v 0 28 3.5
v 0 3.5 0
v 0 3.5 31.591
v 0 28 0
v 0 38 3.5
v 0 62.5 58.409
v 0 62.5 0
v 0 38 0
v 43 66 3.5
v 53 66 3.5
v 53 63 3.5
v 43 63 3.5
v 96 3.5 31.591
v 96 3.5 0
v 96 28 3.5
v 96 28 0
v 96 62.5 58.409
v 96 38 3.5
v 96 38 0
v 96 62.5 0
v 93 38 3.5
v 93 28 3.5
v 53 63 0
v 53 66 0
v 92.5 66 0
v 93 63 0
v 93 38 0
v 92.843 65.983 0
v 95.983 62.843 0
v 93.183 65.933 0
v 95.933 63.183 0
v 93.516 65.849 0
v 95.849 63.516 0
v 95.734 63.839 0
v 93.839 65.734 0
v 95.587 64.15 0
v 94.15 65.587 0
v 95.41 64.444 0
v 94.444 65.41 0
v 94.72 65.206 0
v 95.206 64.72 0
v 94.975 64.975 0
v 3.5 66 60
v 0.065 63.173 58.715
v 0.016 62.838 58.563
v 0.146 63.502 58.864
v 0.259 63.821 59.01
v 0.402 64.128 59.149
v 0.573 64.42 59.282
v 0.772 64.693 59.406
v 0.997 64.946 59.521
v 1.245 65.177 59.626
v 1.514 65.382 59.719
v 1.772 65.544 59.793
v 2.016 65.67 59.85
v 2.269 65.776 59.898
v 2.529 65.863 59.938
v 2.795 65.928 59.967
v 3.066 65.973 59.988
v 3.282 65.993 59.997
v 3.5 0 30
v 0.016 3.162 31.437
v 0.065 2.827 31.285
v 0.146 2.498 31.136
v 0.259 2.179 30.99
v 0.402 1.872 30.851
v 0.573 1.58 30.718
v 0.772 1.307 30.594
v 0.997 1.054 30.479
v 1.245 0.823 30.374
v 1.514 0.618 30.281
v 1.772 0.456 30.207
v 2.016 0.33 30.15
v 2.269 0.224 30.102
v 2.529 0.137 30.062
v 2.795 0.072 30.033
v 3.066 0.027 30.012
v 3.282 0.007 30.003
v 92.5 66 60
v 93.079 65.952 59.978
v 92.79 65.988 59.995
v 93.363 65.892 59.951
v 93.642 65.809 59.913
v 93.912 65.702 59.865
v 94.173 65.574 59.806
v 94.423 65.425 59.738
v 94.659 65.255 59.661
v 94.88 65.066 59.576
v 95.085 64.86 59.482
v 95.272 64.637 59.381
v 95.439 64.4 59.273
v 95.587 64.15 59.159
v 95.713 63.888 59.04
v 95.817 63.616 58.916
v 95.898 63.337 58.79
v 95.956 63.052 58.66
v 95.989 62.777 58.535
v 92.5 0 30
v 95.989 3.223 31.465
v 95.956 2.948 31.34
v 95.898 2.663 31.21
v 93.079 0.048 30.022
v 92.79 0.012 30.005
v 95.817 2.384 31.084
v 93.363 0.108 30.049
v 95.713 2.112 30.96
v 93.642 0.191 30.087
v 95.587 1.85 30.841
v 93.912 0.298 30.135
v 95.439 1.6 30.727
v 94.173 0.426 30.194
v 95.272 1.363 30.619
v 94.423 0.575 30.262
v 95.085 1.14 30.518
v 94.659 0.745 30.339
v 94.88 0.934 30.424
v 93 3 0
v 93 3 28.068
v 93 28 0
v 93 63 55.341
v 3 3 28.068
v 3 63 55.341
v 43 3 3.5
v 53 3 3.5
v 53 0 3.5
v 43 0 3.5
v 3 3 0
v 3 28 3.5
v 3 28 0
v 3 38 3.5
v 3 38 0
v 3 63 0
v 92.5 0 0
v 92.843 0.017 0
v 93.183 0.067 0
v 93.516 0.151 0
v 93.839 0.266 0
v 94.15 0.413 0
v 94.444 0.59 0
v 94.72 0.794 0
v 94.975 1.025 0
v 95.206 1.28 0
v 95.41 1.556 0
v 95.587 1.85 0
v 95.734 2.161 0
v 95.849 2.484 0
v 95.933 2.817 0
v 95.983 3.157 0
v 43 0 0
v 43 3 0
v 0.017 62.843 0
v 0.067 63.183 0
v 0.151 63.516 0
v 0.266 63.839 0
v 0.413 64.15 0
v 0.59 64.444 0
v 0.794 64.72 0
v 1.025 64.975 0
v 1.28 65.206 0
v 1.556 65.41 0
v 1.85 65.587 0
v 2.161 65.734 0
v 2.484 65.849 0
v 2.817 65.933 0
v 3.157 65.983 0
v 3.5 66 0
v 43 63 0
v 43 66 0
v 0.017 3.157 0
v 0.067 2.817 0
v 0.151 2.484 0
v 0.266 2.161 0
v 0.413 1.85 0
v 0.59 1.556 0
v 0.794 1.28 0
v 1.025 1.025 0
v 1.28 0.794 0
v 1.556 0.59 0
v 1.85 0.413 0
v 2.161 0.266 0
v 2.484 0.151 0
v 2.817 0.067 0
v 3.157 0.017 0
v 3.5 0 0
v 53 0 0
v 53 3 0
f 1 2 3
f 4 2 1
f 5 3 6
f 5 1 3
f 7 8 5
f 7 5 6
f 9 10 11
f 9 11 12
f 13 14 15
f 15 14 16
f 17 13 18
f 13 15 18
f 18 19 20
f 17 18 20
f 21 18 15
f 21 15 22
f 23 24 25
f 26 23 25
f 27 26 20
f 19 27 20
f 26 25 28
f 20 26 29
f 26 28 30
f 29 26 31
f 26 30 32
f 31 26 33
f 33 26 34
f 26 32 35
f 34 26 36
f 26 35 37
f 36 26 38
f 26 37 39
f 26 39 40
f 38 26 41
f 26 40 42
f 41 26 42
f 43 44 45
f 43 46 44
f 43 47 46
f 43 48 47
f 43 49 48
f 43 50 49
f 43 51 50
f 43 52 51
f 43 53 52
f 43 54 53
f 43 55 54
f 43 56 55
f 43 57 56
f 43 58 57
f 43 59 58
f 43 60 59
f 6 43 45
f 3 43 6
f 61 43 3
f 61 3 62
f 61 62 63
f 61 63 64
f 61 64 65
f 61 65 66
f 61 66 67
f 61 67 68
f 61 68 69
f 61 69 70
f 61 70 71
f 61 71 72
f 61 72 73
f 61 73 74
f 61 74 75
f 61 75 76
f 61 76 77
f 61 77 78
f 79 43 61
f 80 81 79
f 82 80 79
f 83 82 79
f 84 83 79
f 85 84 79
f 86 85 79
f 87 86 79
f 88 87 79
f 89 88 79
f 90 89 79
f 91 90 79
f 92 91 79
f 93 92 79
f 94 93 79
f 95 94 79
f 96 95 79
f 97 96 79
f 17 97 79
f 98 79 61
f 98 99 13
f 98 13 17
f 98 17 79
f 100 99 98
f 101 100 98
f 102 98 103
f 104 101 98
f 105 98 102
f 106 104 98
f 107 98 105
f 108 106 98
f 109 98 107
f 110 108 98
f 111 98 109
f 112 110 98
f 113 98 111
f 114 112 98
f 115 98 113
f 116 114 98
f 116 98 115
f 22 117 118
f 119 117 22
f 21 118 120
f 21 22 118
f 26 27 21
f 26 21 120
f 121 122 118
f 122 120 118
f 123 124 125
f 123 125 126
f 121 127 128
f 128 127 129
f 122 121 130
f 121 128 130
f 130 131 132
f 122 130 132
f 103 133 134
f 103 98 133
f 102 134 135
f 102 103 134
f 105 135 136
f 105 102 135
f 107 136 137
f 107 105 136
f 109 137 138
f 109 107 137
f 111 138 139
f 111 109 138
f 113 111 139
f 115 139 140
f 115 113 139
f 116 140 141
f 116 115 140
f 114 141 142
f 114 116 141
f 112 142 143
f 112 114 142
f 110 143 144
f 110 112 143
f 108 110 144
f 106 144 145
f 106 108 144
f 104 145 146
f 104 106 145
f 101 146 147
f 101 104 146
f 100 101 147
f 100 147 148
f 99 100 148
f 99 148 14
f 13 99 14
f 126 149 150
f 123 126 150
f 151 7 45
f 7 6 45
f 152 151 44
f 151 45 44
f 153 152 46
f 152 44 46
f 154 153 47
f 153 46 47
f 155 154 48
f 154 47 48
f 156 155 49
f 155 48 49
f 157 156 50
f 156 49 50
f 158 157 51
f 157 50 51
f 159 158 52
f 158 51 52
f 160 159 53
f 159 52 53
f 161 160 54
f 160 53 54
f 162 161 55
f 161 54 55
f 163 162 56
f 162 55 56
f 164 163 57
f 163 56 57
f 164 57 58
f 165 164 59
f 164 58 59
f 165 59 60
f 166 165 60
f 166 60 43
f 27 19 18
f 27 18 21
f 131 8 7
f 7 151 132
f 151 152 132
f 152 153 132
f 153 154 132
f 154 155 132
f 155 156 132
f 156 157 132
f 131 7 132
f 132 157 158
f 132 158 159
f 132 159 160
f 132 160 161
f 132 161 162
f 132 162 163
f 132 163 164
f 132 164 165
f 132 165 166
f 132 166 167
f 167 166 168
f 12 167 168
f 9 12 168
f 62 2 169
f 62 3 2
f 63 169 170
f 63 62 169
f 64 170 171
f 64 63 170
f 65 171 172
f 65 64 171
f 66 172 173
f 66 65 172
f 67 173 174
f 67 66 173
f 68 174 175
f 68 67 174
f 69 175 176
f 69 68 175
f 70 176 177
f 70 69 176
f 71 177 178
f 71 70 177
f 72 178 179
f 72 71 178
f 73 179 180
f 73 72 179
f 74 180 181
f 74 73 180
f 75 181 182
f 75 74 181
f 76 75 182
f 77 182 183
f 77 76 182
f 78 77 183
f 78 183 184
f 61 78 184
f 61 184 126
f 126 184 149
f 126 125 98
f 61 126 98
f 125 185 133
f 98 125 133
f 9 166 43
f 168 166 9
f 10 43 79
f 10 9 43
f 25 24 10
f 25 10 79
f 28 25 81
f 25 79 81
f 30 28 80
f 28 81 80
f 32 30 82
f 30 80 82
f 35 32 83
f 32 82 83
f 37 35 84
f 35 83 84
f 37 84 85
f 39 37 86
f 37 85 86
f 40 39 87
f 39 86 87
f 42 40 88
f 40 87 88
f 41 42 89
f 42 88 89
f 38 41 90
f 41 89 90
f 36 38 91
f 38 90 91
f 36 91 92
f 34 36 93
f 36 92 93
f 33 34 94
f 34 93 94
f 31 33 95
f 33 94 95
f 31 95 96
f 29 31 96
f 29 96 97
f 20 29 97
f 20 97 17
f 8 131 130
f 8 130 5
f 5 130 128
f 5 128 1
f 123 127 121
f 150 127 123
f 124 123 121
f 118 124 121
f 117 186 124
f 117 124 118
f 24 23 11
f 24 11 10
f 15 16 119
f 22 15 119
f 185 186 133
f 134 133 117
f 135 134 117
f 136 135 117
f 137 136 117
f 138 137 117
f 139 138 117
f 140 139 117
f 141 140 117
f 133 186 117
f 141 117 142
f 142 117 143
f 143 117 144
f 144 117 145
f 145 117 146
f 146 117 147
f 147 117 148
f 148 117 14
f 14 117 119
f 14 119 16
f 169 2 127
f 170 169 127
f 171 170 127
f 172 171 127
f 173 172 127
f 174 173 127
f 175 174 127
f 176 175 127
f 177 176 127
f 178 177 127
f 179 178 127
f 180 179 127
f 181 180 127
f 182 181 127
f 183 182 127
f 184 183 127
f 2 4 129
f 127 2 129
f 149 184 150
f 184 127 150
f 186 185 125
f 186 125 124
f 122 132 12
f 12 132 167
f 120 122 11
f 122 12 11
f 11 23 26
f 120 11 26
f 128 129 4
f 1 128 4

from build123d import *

# Parameters (mm, degrees)
CROQUIS1_W              = 96
CROQUIS1_H              = 66
SALIENTE_EXTRUIR1_DEPTH = 60
CORTAR_EXTRUIR1_DEPTH   = 100
VACIADO1_T              = -3
CROQUIS3_W              = 3
CROQUIS3_H              = 5
CROQUIS3_W_2            = 5
CROQUIS3_H_2            = 3
CROQUIS3_W_3            = 10
CROQUIS3_H_3            = 10
CORTAR_EXTRUIR2_DEPTH   = 3.5
REDONDEO1_R             = 3.5


with BuildPart() as part:
    # Croquis1 → Saliente-Extruir1 (new body)
    with BuildSketch(Plane.XY):
        with Locations((48, 33)):
            Rectangle(CROQUIS1_W, CROQUIS1_H)
    extrude(amount=SALIENTE_EXTRUIR1_DEPTH)

    # Croquis2 → Cortar-Extruir1 (cut)
    with BuildSketch(Plane(origin=(96, 0, 0), x_dir=(0, 0, -1), z_dir=(1, 0, 0))):
        Polygon((-60, 66), (-30, 0), (-60, 0), align=None)
    extrude(amount=-CORTAR_EXTRUIR1_DEPTH, mode=Mode.SUBTRACT)

    # Vaciado1
    vaciado1_openings = [part.faces().sort_by_distance(p)[0] for p in [
        (48, 33, 0),
    ]]
    offset(amount=VACIADO1_T, openings=vaciado1_openings, kind=Kind.INTERSECTION)

    # Croquis3 → Cortar-Extruir2 (cut)
    with BuildSketch(Plane(origin=(0, 0, 0), x_dir=(-1, 0, 0), z_dir=(0, 0, -1))):
        with Locations((-1.5, 35.5)):
            Rectangle(CROQUIS3_W, CROQUIS3_H)
        with Locations((-1.5, 30.5)):
            Rectangle(CROQUIS3_W, CROQUIS3_H)
        with Locations((-45.5, 64.5)):
            Rectangle(CROQUIS3_W_2, CROQUIS3_H_2)
        with Locations((-50.5, 64.5)):
            Rectangle(CROQUIS3_W_2, CROQUIS3_H_2)
        with Locations((-48, 1.5)):
            Rectangle(CROQUIS3_W_3, CROQUIS3_H_2)
        with Locations((-94.5, 33)):
            Rectangle(CROQUIS3_W, CROQUIS3_H_3)
    extrude(amount=-CORTAR_EXTRUIR2_DEPTH, mode=Mode.SUBTRACT)

    # Redondeo1
    redondeo1_edges = [part.edges().sort_by_distance(p)[0] for p in [
        (96, 0, 15),
        (0, 0, 15),
        (0, 66, 30),
        (96, 66, 30),
    ]]
    fillet(redondeo1_edges, radius=REDONDEO1_R)


solid = part.part
